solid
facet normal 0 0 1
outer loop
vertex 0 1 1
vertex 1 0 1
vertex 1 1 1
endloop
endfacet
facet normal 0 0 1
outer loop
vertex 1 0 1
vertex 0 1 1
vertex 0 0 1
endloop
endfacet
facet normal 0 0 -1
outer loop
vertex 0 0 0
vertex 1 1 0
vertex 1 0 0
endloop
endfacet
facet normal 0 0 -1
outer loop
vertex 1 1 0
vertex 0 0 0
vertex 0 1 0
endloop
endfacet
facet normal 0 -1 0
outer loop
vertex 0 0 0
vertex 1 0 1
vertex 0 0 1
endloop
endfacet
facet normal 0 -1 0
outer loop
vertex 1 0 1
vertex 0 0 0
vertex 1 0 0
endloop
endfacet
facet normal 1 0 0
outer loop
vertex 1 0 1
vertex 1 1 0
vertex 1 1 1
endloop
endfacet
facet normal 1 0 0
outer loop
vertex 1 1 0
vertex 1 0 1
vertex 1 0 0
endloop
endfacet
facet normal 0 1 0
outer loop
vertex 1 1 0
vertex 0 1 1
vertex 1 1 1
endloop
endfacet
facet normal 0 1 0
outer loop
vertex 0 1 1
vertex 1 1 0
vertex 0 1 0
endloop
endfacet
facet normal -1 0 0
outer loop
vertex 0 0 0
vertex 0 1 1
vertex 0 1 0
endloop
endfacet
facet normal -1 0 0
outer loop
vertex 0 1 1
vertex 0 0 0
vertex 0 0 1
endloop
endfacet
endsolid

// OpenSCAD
// Probe: can OpenSCAD 2021.01 parse "2,1,1.5" into numbers with only builtins?
DIG = "0123456789";

function _dv(c) = let (h = search(c, DIG)) len(h) == 0 ? -1 : h[0];

// number starting at i; returns [value, next_index]
function _num(s, i, acc = 0, seen = false, frac = 0) =
    i >= len(s) ? [seen ? acc : undef, i] :
    let (d = _dv(s[i]))
    d >= 0 ? (frac == 0 ? _num(s, i+1, acc*10 + d, true, 0)
                        : _num(s, i+1, acc + d*frac, true, frac/10)) :
    (s[i] == "." && frac == 0) ? _num(s, i+1, acc, seen, 0.1) :
    [seen ? acc : undef, i];

function _scan(s, i = 0, out = []) =
    i >= len(s) ? out :
    let (r = _num(s, i))
    r[0] == undef ? _scan(s, i+1, out) : _scan(s, r[1], concat(out, [r[0]]));

function parse_nums(s) = _scan(s);

echo(A = parse_nums("2,1,1.5"));
echo(B = parse_nums(" 3 , 0.25,10 "));
echo(C = parse_nums(""));
echo(D = parse_nums("junk"));
echo(E = parse_nums("1,,2"));
echo(F = parse_nums("1.25"));
echo(G = parse_nums("0.5,0.5,0.5,0.5"));
cube(1);
